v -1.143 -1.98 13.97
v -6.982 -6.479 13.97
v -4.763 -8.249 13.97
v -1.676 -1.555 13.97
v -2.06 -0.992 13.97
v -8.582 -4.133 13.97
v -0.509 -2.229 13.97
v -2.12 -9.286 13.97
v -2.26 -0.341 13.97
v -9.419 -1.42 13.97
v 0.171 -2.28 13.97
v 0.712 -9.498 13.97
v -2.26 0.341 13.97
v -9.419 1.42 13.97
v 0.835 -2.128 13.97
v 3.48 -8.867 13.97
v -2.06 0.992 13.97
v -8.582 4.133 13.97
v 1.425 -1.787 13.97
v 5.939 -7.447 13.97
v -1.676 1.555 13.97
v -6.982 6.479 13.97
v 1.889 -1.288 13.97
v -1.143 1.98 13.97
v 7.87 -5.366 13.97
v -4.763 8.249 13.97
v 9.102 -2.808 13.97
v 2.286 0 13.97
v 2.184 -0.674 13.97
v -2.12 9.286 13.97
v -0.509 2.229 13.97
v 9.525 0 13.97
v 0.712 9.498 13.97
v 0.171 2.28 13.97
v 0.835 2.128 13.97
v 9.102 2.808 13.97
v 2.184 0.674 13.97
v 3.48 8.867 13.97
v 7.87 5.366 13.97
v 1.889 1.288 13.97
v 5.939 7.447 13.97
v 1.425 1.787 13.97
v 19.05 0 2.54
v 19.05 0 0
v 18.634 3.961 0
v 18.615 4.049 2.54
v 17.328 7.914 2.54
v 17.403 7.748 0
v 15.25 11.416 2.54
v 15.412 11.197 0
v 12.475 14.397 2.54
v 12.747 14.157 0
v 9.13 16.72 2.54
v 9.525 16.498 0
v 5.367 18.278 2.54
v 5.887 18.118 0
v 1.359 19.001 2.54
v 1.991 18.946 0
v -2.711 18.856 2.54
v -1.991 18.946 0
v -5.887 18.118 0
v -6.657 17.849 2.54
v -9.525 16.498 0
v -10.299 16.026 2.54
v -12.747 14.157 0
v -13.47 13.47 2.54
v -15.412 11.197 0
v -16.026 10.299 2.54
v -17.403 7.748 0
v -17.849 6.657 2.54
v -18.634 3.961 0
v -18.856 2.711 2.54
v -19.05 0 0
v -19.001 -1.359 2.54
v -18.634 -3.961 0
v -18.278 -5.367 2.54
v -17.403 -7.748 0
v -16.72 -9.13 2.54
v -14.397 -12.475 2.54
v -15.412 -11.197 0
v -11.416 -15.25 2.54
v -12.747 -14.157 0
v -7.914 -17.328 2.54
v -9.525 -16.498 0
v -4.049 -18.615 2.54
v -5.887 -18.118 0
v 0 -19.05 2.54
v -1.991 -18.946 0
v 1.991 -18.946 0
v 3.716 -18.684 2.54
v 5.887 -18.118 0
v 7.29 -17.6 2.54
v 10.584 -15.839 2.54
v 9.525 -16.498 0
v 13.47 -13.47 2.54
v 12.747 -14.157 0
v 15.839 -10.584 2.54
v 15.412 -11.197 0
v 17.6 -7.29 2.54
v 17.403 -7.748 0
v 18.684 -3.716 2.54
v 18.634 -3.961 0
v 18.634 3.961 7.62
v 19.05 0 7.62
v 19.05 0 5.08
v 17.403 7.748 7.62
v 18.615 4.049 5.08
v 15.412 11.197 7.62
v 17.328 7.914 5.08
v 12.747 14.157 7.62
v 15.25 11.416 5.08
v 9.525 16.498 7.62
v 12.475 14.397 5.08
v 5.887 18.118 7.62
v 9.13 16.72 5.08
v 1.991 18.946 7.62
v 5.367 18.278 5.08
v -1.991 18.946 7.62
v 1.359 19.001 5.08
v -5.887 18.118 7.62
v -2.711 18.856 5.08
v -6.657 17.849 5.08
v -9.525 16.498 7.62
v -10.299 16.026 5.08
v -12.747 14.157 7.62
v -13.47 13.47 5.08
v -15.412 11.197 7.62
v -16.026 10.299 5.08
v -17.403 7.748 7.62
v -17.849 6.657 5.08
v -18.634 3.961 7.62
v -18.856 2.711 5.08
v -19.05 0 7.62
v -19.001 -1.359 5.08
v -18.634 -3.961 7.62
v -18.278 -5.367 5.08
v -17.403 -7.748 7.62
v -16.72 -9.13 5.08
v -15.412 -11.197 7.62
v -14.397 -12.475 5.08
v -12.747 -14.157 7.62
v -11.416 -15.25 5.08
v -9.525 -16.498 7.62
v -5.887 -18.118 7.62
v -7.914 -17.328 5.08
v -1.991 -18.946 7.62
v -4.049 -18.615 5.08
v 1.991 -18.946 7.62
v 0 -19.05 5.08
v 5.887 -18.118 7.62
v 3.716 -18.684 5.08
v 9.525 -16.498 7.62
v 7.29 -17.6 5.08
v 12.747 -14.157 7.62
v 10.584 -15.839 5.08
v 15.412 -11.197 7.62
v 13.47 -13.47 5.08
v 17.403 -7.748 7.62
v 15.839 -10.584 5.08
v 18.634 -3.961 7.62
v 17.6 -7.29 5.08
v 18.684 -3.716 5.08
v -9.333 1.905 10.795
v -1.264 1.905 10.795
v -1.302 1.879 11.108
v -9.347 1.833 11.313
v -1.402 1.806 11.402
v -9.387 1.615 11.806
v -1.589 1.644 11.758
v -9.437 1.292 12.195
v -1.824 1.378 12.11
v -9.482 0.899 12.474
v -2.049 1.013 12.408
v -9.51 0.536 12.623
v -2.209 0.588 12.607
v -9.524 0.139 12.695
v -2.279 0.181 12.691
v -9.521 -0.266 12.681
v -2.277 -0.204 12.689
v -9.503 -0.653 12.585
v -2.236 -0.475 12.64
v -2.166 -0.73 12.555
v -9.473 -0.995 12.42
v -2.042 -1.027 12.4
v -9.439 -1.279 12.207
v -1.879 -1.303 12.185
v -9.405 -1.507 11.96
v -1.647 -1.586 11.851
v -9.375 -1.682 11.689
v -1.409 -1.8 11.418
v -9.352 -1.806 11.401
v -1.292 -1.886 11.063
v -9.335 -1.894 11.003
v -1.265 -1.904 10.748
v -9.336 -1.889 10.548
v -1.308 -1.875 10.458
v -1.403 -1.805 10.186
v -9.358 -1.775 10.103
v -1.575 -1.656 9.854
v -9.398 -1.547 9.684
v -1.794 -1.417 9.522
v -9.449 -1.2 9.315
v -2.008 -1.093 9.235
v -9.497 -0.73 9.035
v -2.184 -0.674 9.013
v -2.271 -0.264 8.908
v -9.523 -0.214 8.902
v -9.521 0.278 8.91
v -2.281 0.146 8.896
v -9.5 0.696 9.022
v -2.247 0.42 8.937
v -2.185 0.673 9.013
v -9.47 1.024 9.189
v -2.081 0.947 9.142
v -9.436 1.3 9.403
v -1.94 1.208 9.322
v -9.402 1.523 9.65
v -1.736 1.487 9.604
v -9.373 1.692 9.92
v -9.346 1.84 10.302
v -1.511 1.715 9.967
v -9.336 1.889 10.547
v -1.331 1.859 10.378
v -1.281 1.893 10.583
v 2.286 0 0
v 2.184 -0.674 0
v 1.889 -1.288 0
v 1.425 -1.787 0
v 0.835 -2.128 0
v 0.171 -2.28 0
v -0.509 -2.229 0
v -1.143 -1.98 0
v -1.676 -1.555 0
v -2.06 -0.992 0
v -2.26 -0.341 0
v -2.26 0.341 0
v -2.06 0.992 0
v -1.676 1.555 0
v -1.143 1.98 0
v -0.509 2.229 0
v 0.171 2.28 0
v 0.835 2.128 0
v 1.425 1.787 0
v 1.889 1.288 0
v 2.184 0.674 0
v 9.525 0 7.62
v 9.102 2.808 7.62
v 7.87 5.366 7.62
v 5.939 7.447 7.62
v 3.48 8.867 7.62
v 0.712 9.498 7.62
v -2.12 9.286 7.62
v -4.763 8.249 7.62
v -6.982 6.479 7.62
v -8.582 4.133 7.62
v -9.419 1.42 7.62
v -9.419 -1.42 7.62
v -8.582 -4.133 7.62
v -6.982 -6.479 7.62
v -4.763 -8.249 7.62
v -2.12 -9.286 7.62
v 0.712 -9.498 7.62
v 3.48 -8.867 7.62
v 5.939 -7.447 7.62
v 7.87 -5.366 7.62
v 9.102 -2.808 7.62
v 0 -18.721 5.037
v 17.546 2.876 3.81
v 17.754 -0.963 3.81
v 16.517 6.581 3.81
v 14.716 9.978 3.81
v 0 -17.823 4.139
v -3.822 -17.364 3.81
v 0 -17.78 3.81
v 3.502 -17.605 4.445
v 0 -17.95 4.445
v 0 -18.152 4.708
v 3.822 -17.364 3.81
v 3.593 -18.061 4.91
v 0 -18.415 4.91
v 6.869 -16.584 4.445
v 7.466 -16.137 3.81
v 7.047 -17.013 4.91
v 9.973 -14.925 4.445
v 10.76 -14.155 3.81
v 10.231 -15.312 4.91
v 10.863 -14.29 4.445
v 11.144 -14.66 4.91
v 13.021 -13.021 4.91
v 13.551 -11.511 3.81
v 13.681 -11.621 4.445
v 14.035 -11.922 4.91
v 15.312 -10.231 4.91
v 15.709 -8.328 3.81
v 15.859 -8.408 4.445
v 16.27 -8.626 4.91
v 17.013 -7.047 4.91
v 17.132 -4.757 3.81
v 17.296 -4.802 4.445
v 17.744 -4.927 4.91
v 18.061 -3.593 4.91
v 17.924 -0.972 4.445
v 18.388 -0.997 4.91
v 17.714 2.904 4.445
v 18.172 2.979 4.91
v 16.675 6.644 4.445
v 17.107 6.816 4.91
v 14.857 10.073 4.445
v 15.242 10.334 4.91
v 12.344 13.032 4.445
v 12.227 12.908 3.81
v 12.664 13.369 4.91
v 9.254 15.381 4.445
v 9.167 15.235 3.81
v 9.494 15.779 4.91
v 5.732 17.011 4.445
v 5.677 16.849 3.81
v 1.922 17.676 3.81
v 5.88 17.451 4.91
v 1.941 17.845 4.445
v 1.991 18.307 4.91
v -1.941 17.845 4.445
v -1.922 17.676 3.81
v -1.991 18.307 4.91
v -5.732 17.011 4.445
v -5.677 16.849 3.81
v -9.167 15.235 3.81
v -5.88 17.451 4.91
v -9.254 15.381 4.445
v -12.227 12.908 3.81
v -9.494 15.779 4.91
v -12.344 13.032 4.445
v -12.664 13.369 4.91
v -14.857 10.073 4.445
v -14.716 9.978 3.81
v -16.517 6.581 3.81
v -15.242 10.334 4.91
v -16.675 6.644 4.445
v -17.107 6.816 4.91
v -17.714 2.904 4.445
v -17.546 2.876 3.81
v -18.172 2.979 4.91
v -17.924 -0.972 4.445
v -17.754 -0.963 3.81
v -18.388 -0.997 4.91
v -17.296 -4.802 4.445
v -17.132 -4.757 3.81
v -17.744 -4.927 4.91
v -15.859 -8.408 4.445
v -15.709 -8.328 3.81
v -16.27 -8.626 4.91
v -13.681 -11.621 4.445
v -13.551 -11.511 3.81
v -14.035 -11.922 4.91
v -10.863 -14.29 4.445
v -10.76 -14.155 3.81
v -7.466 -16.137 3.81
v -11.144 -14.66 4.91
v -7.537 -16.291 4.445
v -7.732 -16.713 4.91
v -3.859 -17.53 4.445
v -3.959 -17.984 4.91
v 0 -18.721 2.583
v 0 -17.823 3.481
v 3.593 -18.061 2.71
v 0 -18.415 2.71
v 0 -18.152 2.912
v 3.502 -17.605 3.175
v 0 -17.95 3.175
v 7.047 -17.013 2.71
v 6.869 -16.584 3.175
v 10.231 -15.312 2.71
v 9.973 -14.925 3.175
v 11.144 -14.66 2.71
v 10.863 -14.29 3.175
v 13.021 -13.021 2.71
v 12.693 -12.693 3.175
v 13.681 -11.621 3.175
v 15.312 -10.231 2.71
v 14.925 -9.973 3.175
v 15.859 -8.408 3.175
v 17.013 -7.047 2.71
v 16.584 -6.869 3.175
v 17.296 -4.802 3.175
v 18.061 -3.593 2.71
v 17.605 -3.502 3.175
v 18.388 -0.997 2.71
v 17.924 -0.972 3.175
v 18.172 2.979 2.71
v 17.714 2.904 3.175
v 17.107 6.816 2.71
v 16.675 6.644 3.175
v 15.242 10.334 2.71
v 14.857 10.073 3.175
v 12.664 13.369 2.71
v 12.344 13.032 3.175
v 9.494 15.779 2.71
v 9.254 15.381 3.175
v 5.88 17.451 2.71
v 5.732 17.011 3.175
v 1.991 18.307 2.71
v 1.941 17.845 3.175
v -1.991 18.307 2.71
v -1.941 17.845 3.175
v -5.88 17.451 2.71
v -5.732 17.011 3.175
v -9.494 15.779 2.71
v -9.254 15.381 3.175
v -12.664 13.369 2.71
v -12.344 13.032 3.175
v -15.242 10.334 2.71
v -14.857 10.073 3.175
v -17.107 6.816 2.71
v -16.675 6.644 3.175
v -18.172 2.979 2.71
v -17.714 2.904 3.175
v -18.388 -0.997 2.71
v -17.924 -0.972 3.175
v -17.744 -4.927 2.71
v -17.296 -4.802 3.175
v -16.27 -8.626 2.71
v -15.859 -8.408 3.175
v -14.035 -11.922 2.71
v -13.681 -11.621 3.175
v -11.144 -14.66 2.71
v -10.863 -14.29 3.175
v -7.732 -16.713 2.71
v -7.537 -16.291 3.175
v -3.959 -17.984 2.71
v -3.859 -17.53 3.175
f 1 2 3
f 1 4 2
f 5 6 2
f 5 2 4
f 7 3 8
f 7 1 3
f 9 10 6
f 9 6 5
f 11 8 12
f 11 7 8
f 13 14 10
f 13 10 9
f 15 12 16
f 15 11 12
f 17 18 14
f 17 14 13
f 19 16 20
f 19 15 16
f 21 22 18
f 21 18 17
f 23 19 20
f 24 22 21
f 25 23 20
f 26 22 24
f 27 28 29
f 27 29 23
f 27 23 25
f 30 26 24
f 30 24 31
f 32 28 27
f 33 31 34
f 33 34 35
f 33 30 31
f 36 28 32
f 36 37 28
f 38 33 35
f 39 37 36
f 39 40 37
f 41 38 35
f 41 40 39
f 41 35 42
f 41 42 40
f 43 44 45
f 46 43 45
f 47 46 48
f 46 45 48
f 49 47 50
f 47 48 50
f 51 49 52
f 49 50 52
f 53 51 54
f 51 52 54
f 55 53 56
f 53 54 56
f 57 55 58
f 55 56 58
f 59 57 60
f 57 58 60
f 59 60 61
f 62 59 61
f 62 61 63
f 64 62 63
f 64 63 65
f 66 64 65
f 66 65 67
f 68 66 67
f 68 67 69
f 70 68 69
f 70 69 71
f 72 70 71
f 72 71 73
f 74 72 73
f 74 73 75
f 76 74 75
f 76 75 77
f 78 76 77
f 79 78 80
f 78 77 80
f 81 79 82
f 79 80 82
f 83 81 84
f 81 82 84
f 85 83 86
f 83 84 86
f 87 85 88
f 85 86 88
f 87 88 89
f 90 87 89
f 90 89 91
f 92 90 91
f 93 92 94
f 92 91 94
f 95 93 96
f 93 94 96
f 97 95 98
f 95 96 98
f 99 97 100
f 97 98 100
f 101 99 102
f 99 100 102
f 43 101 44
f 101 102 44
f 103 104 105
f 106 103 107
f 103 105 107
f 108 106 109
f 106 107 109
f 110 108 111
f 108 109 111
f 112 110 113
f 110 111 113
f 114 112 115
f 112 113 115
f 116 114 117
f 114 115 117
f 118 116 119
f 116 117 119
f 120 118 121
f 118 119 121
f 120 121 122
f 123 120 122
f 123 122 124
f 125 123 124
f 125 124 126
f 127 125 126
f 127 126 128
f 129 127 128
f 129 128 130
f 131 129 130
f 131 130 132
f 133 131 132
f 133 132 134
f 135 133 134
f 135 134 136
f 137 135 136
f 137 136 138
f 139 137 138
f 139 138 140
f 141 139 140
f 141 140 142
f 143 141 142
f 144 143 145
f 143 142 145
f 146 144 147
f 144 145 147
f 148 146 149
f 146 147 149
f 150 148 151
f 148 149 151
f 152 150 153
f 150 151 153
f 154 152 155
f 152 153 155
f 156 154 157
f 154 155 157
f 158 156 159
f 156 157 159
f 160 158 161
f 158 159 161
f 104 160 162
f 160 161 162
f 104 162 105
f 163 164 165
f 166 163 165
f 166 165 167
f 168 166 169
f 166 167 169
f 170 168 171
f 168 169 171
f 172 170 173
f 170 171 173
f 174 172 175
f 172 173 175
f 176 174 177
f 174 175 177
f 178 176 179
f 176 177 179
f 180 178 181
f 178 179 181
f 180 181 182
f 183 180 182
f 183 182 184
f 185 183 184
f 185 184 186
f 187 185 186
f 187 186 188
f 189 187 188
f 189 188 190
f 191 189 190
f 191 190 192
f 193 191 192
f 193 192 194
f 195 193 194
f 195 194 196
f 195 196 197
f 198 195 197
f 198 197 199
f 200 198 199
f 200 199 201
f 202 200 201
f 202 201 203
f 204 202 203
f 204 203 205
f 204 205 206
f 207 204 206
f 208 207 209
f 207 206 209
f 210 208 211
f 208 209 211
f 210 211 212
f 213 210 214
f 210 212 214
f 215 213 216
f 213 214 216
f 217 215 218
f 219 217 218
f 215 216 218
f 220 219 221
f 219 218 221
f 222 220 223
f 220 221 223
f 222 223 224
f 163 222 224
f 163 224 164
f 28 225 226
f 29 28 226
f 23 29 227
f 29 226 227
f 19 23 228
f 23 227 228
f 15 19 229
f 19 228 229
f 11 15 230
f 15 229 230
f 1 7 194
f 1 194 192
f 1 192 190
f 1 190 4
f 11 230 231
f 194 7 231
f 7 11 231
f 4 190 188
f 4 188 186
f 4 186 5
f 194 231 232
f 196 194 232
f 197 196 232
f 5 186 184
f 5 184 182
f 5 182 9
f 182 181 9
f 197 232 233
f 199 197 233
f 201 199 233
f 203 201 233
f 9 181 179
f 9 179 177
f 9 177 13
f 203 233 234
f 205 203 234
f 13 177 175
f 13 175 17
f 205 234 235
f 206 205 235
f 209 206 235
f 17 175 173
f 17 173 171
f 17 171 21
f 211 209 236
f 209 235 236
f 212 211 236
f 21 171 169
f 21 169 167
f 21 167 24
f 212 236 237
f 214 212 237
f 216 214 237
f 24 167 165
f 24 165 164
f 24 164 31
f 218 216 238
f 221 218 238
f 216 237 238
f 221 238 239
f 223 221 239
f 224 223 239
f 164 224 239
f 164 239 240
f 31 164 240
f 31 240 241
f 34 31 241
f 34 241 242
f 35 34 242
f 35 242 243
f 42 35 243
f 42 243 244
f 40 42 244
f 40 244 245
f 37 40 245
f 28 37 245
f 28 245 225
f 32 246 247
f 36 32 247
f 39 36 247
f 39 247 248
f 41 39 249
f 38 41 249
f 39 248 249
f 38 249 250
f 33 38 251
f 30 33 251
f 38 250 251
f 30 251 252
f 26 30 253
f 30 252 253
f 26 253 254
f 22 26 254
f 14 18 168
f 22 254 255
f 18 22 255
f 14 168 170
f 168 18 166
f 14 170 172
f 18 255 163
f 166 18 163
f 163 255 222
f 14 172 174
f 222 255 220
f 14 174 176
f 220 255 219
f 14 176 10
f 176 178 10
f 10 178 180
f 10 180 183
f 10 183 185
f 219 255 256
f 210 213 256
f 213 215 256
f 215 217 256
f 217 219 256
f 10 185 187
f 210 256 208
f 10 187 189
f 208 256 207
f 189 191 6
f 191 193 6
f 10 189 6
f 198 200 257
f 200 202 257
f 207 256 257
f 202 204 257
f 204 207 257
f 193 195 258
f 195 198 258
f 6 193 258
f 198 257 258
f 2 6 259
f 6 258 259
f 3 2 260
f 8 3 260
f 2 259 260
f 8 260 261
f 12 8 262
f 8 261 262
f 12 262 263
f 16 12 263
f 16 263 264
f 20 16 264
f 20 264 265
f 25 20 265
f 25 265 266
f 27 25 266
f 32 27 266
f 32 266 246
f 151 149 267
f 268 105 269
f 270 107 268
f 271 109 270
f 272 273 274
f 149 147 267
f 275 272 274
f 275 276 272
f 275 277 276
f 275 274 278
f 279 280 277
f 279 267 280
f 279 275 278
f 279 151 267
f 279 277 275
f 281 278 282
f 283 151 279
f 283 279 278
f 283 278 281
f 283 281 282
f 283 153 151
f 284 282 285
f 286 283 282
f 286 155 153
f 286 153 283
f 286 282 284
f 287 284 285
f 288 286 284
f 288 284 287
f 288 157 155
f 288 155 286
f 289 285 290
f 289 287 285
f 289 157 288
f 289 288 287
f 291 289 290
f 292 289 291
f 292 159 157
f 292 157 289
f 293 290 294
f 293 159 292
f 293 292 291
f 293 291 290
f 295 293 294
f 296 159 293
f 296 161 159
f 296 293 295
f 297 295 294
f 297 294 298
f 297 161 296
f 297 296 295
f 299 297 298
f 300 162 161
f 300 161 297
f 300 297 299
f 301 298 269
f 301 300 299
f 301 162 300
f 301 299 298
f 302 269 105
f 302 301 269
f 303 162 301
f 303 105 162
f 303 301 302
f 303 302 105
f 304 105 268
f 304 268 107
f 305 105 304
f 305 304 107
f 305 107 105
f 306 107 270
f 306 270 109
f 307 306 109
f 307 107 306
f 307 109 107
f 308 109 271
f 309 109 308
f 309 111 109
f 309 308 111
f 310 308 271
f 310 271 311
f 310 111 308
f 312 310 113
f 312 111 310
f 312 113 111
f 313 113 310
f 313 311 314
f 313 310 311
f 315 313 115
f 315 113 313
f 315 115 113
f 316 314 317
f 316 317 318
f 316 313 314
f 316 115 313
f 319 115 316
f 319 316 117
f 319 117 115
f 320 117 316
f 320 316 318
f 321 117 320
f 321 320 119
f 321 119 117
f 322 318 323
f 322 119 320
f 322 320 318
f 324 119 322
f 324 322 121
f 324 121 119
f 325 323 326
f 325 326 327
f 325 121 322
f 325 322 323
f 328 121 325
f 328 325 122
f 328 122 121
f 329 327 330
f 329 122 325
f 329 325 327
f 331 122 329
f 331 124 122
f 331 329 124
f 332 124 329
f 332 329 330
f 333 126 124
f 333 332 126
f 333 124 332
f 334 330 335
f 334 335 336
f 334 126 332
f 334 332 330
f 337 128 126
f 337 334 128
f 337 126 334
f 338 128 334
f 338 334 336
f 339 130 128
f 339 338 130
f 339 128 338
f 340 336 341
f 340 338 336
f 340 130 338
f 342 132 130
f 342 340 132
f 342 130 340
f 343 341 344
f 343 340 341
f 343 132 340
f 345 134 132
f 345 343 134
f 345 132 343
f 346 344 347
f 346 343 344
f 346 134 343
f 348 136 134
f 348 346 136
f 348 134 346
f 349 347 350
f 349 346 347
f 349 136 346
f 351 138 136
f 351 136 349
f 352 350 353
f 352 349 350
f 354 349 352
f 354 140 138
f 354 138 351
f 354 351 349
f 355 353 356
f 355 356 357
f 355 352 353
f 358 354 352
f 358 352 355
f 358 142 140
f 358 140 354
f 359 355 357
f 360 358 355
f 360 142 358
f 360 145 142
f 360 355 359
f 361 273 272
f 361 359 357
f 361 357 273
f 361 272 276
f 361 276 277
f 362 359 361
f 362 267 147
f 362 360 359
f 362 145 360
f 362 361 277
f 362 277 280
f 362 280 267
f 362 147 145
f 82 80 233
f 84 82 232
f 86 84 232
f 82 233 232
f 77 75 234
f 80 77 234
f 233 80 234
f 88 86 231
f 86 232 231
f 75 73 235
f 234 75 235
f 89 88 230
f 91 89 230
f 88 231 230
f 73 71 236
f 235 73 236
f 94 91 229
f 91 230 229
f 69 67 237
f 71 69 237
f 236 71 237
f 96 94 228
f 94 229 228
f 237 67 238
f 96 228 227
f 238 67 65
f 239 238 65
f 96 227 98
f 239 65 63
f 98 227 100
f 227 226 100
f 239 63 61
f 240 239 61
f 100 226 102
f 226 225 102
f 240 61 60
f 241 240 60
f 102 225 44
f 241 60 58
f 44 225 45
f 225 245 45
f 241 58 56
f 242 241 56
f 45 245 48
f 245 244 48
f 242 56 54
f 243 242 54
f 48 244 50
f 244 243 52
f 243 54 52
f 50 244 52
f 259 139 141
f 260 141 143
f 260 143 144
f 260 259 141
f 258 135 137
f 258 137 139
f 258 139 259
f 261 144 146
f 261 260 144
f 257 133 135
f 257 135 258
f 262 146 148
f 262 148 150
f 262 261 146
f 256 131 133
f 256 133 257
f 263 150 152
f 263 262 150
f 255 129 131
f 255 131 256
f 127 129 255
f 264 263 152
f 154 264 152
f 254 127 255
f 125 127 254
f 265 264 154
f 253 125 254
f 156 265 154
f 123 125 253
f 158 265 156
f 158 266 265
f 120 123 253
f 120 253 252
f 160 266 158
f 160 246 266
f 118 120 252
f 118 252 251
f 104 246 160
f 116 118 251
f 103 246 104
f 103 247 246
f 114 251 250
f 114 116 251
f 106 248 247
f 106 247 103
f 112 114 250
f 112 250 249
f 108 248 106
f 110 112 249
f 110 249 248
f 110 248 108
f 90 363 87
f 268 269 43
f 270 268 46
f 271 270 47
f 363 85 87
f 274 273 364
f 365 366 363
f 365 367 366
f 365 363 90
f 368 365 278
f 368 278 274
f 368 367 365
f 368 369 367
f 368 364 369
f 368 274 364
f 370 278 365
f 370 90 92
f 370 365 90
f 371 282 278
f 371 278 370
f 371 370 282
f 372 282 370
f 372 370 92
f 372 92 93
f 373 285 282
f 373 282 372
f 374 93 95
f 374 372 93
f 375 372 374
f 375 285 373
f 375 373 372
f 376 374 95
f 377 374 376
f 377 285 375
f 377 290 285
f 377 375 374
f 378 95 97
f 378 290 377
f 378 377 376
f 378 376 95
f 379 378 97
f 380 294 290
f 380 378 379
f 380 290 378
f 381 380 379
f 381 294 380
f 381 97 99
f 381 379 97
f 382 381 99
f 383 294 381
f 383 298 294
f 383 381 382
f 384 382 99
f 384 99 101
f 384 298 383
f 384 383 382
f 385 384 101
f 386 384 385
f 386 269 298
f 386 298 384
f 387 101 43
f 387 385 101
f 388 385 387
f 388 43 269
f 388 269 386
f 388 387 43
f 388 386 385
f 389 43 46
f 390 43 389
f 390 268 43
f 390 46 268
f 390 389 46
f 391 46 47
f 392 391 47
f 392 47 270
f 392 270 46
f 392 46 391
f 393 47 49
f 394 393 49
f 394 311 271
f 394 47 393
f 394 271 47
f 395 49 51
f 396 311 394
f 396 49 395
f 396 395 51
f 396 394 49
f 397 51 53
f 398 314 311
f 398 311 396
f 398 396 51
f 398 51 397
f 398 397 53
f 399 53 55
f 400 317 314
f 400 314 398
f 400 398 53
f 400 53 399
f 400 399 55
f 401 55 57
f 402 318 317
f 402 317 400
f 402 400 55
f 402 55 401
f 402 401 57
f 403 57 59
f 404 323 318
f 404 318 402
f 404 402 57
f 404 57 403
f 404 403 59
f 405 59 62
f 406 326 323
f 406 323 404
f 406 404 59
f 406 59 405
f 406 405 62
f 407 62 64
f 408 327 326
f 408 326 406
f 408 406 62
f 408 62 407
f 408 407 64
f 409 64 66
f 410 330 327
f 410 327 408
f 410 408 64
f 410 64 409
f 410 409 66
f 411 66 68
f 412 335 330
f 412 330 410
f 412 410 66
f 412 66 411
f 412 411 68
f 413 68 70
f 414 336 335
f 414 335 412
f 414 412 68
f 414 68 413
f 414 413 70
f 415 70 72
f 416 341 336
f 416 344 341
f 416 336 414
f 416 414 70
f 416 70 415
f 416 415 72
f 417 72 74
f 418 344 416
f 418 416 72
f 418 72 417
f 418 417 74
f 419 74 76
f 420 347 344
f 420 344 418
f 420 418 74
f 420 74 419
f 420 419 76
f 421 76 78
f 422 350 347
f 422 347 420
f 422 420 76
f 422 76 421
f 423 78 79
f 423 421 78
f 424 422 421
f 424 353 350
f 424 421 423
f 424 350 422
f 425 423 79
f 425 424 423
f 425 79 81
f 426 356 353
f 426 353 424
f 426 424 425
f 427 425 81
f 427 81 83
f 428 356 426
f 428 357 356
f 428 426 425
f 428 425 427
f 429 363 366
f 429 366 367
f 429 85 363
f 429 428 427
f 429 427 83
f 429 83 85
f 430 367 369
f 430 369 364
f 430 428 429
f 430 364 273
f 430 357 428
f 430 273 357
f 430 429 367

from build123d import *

# Parameters (mm, degrees)
F0_R     = 19.05
F1_DEPTH = 7.62
F2_R     = 9.525
F3_DEPTH = 6.35
F4_R     = 1.905
F5_DEPTH = 25.4
F6_R     = 2.286
F7_DEPTH = 101.6
F8_R     = 1.27


with BuildPart() as f1:
    # F0 (on Top) → F1 (new body)
    with BuildSketch(Plane.XY):
        Circle(F0_R)
    extrude(amount=F1_DEPTH)

    # F2 (on face) → F3 (join)
    with BuildSketch(Plane.XY.offset(7.62)):
        Circle(F2_R)
    extrude(amount=F3_DEPTH)

    # F4 (on Right) → F5 (cut)
    with BuildSketch(Plane.YZ):
        with Locations((0, 10.795)):
            Circle(F4_R)
    extrude(amount=-F5_DEPTH, mode=Mode.SUBTRACT)

    # F6 (on face) → F7 (cut)
    with BuildSketch(Plane(origin=(0, 0, 0), x_dir=(1, 0, 0), z_dir=(0, 0, -1))):
        Circle(F6_R)
    extrude(amount=-F7_DEPTH, mode=Mode.SUBTRACT)

    # F8 (on Right) → F9 (revolve, cut)
    with BuildSketch(Plane.YZ):
        with Locations((-19.05, 3.81)):
            Circle(F8_R)
    revolve(axis=Axis((0, 0, 13.97), (0, 0, 1)), mode=Mode.SUBTRACT)


solid = f1.part
